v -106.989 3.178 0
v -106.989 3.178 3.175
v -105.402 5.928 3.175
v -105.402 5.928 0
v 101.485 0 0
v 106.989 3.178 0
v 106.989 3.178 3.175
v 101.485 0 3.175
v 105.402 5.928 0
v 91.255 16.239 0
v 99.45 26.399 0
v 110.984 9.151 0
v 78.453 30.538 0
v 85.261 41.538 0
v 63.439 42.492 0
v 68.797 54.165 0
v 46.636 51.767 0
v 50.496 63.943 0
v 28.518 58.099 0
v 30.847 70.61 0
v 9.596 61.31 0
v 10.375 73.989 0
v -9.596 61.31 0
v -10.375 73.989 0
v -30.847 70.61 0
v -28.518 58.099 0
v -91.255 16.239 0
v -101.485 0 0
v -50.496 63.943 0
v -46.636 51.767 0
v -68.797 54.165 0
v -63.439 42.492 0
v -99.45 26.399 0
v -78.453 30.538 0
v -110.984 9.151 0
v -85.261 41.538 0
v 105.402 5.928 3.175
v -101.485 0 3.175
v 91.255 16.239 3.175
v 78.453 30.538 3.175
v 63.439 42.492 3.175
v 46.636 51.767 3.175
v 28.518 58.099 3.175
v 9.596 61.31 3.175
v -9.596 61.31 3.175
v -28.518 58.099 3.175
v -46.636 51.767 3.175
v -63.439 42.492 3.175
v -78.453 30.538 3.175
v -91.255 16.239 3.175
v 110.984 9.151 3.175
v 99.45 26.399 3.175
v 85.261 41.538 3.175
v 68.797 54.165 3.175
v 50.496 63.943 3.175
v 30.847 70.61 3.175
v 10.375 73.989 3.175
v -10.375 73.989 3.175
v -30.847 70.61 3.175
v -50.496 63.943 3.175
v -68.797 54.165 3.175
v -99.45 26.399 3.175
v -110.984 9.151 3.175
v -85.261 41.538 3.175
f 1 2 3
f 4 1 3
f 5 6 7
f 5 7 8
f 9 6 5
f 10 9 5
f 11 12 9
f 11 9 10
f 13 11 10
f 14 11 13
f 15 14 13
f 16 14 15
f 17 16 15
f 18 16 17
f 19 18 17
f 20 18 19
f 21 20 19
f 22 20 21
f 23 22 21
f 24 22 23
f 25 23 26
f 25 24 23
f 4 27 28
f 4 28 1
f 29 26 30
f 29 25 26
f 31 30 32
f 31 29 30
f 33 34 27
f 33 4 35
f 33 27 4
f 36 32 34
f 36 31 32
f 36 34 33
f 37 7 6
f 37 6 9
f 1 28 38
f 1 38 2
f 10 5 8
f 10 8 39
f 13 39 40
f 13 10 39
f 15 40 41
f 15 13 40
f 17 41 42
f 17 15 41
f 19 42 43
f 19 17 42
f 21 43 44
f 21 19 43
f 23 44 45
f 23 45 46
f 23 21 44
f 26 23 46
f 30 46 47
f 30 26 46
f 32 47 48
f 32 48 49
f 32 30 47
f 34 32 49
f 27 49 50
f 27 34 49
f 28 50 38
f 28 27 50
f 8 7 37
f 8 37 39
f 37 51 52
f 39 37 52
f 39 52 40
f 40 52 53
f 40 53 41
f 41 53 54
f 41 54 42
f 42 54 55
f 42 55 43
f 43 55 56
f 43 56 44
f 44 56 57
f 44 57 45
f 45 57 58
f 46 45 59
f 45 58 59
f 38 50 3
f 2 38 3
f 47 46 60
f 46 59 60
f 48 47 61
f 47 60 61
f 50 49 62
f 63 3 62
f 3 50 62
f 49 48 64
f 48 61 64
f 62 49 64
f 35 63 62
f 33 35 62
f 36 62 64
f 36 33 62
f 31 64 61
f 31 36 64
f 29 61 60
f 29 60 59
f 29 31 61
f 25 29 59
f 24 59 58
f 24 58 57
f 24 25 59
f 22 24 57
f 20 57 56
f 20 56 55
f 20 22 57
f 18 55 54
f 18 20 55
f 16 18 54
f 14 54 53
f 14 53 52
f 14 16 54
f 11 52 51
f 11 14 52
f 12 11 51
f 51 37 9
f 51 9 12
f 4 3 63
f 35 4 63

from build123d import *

# Parameters (mm, degrees)
BOSS_EXTRUDE1_DEPTH = 3.175
CUT_EXTRUDE1_DEPTH  = 135.915478092


with BuildPart() as part:
    # Sketch1 → Boss-Extrude1 (new body)
    with BuildSketch(Plane.XY):
        with BuildLine():
            Line((-101.484623167, 0), (-112.493407504, 6.355924601))
            ThreePointArc((-112.493407504, 6.355924601), (0, 74.413297682), (112.493407504, 6.355924601))
            Line((112.493407504, 6.355924601), (101.484623167, 0))
            ThreePointArc((101.484623167, 0), (0, 61.713297682), (-101.484623167, 0))
        make_face()
    extrude(amount=BOSS_EXTRUDE1_DEPTH)

    # Sketch2 → Cut-Extrude1 (cut, symmetric)
    with BuildSketch(Plane.XY.offset(3.175)):
        with BuildLine():
            Line((112.493407504, 6.355924601), (106.989015336, 3.1779623))
            Line((106.989015336, 3.1779623), (105.401515336, 5.927592957))
            Line((105.401515336, 5.927592957), (110.984177534, 9.15074448))
            ThreePointArc((110.984177534, 9.15074448), (111.747530211, 7.758052979), (112.493407504, 6.355924601))
        make_face()
    cut_extrude1 = extrude(amount=CUT_EXTRUDE1_DEPTH, both=True, mode=Mode.SUBTRACT)

    # Mirror1: Cut-Extrude1 across plane
    add(cut_extrude1.mirror(Plane(origin=(0, 0, 0), x_dir=(0, 0, 1), z_dir=(1, 0, 0))), mode=Mode.SUBTRACT)


solid = part.part
